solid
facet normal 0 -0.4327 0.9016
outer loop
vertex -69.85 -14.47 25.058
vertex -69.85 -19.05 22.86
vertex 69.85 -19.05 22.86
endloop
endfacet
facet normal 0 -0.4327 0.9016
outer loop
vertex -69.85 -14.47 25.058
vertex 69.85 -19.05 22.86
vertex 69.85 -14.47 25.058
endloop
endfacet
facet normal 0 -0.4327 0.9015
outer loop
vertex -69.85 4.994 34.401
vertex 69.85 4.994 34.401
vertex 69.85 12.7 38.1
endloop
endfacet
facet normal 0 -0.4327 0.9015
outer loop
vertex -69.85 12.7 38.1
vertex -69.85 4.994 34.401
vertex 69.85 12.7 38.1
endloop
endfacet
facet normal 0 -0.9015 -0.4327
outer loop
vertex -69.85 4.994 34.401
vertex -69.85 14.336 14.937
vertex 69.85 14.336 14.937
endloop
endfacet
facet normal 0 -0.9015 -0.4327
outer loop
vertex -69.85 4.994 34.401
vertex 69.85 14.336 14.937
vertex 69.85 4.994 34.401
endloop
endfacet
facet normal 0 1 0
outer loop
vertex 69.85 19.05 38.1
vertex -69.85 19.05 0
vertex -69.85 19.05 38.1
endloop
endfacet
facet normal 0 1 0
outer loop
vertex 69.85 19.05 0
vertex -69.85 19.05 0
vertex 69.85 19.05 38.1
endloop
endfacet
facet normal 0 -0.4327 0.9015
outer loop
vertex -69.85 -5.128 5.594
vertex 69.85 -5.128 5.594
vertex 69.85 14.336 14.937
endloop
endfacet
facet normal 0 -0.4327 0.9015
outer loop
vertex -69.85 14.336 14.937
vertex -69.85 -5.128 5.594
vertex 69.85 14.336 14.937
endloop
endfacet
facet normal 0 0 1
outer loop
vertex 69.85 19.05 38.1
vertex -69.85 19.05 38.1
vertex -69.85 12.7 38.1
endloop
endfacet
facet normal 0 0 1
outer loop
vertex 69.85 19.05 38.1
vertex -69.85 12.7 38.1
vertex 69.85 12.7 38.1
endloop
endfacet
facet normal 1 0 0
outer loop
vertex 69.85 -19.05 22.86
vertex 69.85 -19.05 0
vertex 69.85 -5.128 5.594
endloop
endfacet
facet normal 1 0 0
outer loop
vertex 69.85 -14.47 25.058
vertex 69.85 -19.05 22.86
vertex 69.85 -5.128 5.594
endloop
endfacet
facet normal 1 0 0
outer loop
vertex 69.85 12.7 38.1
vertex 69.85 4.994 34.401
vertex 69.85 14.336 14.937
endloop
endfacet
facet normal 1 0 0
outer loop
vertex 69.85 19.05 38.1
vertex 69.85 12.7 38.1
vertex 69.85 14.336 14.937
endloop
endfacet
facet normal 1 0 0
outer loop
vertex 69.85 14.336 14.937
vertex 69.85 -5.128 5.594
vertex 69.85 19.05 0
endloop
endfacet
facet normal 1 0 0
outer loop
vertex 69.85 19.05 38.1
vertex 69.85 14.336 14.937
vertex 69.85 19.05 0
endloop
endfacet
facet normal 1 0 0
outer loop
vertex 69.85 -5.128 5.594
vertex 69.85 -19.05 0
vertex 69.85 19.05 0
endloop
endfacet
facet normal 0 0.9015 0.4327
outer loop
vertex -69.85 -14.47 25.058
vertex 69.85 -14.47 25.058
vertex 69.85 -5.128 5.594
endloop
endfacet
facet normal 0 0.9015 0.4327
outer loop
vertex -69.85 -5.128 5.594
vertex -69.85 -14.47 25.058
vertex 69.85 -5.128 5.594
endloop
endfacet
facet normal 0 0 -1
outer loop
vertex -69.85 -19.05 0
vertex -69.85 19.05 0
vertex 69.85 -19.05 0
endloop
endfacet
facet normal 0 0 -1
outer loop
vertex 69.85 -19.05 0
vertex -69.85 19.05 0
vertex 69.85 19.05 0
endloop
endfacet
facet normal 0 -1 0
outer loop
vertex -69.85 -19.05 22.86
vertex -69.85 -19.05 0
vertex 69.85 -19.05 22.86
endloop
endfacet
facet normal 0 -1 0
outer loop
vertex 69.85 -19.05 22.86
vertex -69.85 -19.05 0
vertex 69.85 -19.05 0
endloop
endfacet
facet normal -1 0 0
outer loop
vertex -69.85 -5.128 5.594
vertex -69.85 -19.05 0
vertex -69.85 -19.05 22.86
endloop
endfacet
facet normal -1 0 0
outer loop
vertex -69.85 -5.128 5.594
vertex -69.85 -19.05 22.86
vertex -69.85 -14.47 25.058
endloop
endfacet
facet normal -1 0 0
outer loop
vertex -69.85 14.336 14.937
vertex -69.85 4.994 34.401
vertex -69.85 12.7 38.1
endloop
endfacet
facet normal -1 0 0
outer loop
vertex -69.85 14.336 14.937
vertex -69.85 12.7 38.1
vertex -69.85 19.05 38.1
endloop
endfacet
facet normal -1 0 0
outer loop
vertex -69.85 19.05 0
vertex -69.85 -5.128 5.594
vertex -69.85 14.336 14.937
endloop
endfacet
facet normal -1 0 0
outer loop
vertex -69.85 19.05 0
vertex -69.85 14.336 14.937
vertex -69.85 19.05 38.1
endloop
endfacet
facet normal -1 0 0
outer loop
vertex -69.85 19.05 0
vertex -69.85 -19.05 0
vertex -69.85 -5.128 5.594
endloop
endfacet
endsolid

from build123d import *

# Parameters (mm, degrees)
F0_W     = 139.7
F0_H     = 38.1
F1_DEPTH = 38.1
F3_DEPTH = 139.701
F5_DEPTH = 139.701


with BuildPart() as f1:
    # F0 (on Top) → F1 (new body)
    with BuildSketch(Plane.XY):
        Rectangle(F0_W, F0_H)
    extrude(amount=F1_DEPTH)

    # F2 (on face) → F3 (cut, through all)
    with BuildSketch(Plane.YZ.offset(69.85)):
        Polygon((-19.05, 22.86), (12.7, 38.1), (-19.05, 38.1), align=None)
    extrude(amount=-F3_DEPTH, mode=Mode.SUBTRACT)

    # F4 (on face) → F5 (cut, through all)
    with BuildSketch(Plane.YZ.offset(69.85)):
        Polygon((14.336284, 14.937055), (4.99362, 34.400938), (-14.470263, 25.058274), (-5.127599, 5.594391), align=None)
    extrude(amount=-F5_DEPTH, mode=Mode.SUBTRACT)


solid = f1.part
